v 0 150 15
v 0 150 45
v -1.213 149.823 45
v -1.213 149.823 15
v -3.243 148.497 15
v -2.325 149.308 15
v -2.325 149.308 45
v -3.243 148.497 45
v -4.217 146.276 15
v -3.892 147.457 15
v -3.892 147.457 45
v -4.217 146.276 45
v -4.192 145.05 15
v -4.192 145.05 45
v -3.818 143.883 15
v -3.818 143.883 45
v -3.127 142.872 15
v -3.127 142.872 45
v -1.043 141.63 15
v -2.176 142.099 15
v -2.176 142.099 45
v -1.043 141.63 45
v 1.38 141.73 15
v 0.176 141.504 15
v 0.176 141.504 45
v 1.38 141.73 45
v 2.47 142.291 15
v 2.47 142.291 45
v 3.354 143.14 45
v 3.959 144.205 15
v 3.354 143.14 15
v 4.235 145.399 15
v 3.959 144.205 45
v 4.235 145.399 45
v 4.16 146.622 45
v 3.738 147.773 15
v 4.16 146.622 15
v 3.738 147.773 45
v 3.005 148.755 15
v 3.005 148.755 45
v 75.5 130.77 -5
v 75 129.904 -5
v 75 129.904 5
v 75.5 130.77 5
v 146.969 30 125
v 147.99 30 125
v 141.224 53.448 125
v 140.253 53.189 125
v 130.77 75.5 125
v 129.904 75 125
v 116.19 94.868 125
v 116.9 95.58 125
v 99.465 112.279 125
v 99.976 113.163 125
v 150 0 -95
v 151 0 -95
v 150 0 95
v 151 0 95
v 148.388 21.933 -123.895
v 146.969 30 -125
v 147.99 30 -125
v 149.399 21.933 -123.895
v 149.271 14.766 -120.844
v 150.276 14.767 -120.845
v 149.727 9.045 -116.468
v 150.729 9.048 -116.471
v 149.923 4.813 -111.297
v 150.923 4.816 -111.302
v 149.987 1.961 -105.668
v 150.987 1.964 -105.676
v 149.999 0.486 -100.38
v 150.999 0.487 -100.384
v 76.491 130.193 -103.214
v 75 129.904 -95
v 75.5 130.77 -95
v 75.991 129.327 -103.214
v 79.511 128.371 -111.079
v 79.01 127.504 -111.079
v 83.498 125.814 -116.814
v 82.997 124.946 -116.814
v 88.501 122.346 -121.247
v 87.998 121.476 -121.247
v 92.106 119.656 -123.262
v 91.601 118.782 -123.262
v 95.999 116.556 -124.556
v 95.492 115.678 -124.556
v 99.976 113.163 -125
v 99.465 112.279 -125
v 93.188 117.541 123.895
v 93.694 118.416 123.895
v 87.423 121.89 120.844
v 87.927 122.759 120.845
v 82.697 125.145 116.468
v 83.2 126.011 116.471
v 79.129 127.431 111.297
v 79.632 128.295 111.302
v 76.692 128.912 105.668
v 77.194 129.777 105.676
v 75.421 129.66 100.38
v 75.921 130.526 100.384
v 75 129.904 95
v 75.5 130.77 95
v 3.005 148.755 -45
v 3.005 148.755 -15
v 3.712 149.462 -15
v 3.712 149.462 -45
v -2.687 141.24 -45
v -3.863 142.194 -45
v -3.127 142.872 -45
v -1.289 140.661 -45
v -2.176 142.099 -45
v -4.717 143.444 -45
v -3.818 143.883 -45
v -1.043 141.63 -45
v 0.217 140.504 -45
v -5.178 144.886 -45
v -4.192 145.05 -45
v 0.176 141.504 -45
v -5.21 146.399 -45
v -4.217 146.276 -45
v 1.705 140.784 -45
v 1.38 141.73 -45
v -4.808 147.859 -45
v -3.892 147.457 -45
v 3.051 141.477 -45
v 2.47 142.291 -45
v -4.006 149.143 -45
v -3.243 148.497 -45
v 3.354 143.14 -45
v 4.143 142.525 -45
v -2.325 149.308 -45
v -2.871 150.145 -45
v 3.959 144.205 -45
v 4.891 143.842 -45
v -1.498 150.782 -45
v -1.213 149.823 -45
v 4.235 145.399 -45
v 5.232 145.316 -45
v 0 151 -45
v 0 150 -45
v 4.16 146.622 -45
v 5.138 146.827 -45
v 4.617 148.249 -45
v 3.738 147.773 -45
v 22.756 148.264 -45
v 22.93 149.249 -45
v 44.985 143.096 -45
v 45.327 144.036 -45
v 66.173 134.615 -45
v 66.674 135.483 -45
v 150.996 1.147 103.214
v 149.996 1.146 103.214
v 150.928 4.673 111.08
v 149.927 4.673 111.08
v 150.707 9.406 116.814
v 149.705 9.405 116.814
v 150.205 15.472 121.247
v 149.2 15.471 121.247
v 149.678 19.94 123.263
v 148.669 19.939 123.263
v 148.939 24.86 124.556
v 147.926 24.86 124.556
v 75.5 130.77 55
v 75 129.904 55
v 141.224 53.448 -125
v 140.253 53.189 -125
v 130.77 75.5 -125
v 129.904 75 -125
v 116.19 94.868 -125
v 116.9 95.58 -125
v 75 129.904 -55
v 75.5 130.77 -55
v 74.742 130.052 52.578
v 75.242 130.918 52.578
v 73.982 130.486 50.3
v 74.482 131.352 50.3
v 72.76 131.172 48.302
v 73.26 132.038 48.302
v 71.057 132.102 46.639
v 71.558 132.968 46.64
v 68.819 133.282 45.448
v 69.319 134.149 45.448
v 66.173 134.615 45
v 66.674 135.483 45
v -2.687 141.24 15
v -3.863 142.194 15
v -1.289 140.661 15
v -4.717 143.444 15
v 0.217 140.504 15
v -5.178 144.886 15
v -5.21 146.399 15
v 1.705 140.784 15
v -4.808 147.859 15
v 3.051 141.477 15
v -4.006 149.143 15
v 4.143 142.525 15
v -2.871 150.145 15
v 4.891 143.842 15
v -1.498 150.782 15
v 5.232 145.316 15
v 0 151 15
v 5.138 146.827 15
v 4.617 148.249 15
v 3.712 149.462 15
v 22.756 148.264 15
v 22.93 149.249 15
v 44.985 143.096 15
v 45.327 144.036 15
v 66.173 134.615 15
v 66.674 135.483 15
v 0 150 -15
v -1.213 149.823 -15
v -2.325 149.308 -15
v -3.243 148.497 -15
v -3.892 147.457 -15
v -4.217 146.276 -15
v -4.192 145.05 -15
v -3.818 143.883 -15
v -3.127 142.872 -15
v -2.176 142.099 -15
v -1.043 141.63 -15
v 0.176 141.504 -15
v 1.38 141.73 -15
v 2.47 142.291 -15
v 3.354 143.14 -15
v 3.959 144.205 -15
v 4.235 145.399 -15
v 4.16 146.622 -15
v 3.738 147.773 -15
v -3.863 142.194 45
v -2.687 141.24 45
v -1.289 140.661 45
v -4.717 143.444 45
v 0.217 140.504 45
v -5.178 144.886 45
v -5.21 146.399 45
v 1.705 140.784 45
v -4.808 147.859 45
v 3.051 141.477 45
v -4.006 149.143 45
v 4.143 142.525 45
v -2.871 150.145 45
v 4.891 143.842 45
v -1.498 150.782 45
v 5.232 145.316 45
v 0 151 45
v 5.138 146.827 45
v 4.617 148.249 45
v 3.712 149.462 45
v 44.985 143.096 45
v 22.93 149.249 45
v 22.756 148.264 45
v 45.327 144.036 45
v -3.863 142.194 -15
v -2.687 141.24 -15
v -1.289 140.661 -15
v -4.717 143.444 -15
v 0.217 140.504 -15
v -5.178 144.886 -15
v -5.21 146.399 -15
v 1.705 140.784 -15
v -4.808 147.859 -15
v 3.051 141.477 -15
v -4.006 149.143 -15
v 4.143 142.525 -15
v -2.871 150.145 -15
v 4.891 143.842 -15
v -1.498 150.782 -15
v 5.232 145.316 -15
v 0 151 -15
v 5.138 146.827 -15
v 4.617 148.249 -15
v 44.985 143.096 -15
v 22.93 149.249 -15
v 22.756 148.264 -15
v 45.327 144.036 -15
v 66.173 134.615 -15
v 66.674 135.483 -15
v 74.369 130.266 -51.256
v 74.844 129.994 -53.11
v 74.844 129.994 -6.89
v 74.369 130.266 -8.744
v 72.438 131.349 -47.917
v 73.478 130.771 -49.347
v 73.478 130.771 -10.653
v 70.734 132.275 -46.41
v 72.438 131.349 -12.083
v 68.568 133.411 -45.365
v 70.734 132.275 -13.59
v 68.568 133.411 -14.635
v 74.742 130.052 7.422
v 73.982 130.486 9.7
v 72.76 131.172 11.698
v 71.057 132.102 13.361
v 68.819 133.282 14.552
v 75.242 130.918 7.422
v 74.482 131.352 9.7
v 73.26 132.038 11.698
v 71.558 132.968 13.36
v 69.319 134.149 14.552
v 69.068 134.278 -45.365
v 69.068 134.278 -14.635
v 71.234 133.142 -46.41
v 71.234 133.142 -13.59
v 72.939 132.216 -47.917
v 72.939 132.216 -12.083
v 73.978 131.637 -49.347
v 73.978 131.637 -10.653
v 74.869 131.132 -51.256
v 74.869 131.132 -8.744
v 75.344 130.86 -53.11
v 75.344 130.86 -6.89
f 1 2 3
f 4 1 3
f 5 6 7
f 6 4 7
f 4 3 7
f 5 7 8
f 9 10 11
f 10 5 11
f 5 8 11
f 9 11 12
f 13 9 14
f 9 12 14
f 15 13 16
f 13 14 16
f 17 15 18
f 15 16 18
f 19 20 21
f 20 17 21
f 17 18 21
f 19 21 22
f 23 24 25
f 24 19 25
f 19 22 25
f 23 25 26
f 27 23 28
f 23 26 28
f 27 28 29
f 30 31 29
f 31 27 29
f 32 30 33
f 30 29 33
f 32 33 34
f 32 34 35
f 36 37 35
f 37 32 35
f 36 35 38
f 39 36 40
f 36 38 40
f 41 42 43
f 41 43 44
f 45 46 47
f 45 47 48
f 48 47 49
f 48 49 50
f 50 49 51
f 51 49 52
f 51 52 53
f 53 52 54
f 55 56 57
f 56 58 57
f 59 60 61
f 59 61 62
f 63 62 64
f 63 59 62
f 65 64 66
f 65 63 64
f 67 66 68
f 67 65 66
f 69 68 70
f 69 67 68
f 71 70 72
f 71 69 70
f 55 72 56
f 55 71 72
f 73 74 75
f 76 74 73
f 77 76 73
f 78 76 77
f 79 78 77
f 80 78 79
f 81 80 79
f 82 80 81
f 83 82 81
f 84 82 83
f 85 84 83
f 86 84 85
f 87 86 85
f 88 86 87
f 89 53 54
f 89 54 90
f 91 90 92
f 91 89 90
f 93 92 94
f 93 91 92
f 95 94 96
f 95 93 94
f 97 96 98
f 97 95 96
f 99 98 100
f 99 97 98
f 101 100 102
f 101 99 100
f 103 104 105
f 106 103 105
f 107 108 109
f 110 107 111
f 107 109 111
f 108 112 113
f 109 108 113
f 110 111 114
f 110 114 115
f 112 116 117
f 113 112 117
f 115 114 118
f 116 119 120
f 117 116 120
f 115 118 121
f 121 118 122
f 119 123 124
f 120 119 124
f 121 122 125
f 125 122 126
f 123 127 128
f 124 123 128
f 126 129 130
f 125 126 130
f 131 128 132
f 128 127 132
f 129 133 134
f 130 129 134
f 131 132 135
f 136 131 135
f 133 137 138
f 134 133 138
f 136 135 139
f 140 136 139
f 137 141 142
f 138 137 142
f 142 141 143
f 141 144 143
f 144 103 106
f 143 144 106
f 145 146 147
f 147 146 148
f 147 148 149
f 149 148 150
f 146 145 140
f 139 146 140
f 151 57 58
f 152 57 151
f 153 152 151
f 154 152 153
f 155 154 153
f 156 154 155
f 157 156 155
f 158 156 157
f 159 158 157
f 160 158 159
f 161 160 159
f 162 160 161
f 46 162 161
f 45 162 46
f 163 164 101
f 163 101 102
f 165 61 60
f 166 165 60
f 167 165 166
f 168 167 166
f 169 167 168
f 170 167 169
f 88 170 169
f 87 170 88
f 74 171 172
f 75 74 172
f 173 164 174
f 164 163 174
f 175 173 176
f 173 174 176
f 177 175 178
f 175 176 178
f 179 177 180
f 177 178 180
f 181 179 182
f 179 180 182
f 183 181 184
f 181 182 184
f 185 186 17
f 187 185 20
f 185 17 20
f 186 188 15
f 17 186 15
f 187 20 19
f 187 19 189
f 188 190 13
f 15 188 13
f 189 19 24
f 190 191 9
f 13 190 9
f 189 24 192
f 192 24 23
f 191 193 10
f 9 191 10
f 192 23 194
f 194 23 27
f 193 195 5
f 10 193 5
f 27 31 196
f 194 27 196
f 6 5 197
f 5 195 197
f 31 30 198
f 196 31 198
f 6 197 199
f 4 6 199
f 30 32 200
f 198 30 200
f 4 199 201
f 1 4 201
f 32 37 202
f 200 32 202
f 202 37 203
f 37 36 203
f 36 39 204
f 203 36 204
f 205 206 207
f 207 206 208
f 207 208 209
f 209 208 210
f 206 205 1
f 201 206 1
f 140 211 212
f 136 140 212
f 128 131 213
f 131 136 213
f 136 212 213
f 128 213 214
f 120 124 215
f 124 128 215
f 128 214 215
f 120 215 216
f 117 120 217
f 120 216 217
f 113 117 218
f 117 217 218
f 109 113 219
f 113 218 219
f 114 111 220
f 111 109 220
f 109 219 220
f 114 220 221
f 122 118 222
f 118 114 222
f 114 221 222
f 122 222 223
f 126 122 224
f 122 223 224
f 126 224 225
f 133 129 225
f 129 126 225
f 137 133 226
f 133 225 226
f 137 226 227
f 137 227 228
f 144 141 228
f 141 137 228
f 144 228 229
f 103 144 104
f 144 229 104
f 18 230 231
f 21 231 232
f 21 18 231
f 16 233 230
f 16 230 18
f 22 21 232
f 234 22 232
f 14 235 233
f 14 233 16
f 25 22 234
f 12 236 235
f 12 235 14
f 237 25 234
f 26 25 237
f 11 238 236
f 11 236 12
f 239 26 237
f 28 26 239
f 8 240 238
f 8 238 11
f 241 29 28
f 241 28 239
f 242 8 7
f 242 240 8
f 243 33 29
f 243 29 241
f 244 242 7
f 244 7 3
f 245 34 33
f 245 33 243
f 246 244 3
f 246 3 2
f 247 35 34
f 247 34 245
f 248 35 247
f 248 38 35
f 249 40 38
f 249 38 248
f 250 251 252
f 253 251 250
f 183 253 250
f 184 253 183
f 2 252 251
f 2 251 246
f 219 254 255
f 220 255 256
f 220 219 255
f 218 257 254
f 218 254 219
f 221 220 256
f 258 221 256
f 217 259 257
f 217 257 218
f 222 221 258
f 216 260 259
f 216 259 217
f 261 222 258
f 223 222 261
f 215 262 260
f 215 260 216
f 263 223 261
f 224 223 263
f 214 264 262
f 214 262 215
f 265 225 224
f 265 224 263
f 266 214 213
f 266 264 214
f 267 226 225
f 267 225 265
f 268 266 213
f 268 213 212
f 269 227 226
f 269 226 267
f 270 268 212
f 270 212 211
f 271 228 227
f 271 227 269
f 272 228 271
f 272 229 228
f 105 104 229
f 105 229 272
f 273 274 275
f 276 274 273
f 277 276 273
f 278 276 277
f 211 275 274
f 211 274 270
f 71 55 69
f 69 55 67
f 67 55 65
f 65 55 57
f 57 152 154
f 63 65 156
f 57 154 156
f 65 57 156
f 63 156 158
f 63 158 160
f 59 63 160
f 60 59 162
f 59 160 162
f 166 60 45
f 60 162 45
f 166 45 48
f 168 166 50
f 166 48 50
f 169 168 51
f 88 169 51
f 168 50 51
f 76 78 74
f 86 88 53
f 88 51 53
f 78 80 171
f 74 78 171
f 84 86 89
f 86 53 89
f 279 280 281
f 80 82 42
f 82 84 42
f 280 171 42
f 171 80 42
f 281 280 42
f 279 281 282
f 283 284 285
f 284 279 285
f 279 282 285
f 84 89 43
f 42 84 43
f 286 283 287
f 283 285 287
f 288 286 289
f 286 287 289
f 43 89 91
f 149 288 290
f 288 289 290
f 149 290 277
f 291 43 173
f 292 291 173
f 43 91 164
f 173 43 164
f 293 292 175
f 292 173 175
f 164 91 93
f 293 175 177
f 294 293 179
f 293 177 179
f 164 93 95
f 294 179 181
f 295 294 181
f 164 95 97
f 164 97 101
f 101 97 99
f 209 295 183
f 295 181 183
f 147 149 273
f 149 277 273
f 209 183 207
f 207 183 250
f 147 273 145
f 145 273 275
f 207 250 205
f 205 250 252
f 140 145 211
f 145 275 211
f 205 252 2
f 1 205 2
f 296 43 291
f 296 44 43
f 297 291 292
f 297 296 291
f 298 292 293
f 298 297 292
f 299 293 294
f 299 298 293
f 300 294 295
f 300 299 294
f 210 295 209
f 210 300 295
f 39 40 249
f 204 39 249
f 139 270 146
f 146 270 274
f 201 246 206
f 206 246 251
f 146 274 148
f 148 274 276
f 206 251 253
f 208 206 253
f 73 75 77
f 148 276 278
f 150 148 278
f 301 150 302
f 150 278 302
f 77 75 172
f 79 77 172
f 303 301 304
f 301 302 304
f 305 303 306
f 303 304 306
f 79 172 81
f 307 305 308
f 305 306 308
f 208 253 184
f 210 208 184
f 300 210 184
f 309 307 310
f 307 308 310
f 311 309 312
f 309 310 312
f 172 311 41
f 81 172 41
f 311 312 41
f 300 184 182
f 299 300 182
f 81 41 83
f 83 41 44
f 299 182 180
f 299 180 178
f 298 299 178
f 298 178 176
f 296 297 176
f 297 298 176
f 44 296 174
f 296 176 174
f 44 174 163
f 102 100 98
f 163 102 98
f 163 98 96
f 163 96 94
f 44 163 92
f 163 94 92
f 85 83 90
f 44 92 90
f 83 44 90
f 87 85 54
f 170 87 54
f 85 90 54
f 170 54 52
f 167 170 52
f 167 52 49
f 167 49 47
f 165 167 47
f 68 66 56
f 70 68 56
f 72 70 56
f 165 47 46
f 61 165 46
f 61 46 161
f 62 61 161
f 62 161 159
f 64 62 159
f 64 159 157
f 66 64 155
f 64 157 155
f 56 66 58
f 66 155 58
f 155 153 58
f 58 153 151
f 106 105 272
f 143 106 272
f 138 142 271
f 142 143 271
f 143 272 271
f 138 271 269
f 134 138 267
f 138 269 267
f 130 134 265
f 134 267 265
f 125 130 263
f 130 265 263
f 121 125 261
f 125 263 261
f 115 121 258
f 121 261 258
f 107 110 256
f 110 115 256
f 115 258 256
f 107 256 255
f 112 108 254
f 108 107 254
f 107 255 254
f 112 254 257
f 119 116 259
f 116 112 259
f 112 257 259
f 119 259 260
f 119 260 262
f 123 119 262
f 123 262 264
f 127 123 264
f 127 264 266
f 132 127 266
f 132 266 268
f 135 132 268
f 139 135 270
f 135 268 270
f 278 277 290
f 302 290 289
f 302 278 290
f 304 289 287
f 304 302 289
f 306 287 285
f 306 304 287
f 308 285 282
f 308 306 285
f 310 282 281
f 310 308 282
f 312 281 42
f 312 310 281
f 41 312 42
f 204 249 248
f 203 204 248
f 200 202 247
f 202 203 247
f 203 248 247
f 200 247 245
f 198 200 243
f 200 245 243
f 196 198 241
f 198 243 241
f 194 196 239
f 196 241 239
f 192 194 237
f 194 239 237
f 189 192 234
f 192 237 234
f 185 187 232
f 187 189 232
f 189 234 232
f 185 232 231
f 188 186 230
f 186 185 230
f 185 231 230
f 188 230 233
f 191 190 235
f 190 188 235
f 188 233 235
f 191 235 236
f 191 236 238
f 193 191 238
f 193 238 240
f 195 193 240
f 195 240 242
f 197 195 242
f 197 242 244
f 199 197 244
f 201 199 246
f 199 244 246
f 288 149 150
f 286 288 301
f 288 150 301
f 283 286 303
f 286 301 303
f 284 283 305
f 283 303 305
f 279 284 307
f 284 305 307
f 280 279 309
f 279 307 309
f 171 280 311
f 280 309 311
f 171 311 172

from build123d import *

# Parameters (mm, degrees)
BOSS_EXTRUDE1_DEPTH = 125
CUT_EXTRUDE1_DEPTH  = 15
CUT_EXTRUDE2_DEPTH  = 80
FILLET1_START       = 83.934299194
FILLET1_DEPTH       = 68.065700806
FILLET1_START_2     = 78.711006452
FILLET1_2_DEPTH     = 73.288993548
FILLET2_R           = 10


with BuildPart() as part:
    # Sketch2 → Boss-Extrude1 (new, symmetric)
    with BuildSketch(Plane.XY):
        with BuildLine():
            Line((3.00520382, 148.75520382), (3.712310601, 149.462310601))
            ThreePointArc((3.712310601, 149.462310601), (-2.00908802, 140.899632454), (0, 151))
            ThreePointArc((0, 151), (106.773123959, 106.773123959), (151, 0))
            Line((151, 0), (150, 0))
            ThreePointArc((150, 0), (106.066017178, 106.066017178), (0, 150))
            ThreePointArc((0, 150), (-1.626404588, 141.823511987), (3.00520382, 148.75520382))
        make_face()
    extrude(amount=BOSS_EXTRUDE1_DEPTH, both=True)

    # Sketch3 → Cut-Extrude1 (cut, symmetric)
    with BuildSketch(Plane.XY):
        with BuildLine():
            Line((75, 129.903810568), (75.5, 130.769835971))
            ThreePointArc((75.5, 130.769835971), (39.08167581, 145.85479977), (0, 151))
            ThreePointArc((0, 151), (-2.00908802, 140.899632454), (3.712310601, 149.462310601))
            Line((3.712310601, 149.462310601), (3.00520382, 148.75520382))
            ThreePointArc((3.00520382, 148.75520382), (-1.626404588, 141.823511987), (0, 150))
            ThreePointArc((0, 150), (38.822856765, 144.888873943), (75, 129.903810568))
        make_face()
    extrude(amount=CUT_EXTRUDE1_DEPTH, both=True, mode=Mode.SUBTRACT)

    # Sketch4 → Cut-Extrude2 (cut)
    with BuildSketch(Plane.XY.offset(125)):
        with BuildLine():
            Line((75, 129.903810568), (75.5, 130.769835971))
            ThreePointArc((75.5, 130.769835971), (39.08167581, 145.85479977), (0, 151))
            ThreePointArc((0, 151), (-2.00908802, 140.899632454), (3.712310601, 149.462310601))
            Line((3.712310601, 149.462310601), (3.00520382, 148.75520382))
            ThreePointArc((3.00520382, 148.75520382), (-1.626404588, 141.823511987), (0, 150))
            ThreePointArc((0, 150), (38.822856765, 144.888873943), (75, 129.903810568))
        make_face()
    cut_extrude2 = extrude(amount=-CUT_EXTRUDE2_DEPTH, mode=Mode.SUBTRACT)

    # Mirror1: Cut-Extrude2 across plane
    add(cut_extrude2.mirror(Plane.XY), mode=Mode.SUBTRACT)

    # Fillet1: read off the stored shape, not the designer's step
    # Fillet1 outline → Fillet1 (cut)
    with BuildSketch(Plane(origin=(0, 0, 0), x_dir=(0.8660254037844386, -0.4999999999999999, 0), z_dir=(0.4999999999999999, 0.8660254037844388, 0)).offset(FILLET1_START)):
        with BuildLine():
            Line((0, 125), (0, 95))
            ThreePointArc((0, 95), (8.786796564, 116.213203436), (30, 125))
            Line((30, 125), (0, 125))
        make_face()
        with BuildLine():
            Line((0, -125), (30, -125))
            ThreePointArc((30, -125), (8.786796564, -116.213203436), (0, -95))
            Line((0, -95), (0, -125))
        make_face()
    extrude(amount=FILLET1_DEPTH, mode=Mode.SUBTRACT)

    # Fillet1 2 outline → Fillet1 2 (cut)
    with BuildSketch(Plane.YZ.offset(FILLET1_START_2)):
        with BuildLine():
            ThreePointArc((30, -125), (8.786796564, -116.213203436), (0, -95))
            Line((0, -95), (0, -125))
            Line((0, -125), (30, -125))
        make_face()
        with BuildLine():
            Line((0, 125), (0, 95))
            ThreePointArc((0, 95), (8.786796564, 116.213203436), (30, 125))
            Line((30, 125), (0, 125))
        make_face()
    extrude(amount=FILLET1_2_DEPTH, mode=Mode.SUBTRACT)

    # Fillet2
    fillet2_edges = [part.edges().sort_by_distance(p)[0] for p in [
        (75.25, 130.33682327, -15),
        (75.25, 130.33682327, 15),
        (75.25, 130.33682327, 45),
        (75.25, 130.33682327, -45),
    ]]
    fillet(fillet2_edges, radius=FILLET2_R)


solid = part.part
